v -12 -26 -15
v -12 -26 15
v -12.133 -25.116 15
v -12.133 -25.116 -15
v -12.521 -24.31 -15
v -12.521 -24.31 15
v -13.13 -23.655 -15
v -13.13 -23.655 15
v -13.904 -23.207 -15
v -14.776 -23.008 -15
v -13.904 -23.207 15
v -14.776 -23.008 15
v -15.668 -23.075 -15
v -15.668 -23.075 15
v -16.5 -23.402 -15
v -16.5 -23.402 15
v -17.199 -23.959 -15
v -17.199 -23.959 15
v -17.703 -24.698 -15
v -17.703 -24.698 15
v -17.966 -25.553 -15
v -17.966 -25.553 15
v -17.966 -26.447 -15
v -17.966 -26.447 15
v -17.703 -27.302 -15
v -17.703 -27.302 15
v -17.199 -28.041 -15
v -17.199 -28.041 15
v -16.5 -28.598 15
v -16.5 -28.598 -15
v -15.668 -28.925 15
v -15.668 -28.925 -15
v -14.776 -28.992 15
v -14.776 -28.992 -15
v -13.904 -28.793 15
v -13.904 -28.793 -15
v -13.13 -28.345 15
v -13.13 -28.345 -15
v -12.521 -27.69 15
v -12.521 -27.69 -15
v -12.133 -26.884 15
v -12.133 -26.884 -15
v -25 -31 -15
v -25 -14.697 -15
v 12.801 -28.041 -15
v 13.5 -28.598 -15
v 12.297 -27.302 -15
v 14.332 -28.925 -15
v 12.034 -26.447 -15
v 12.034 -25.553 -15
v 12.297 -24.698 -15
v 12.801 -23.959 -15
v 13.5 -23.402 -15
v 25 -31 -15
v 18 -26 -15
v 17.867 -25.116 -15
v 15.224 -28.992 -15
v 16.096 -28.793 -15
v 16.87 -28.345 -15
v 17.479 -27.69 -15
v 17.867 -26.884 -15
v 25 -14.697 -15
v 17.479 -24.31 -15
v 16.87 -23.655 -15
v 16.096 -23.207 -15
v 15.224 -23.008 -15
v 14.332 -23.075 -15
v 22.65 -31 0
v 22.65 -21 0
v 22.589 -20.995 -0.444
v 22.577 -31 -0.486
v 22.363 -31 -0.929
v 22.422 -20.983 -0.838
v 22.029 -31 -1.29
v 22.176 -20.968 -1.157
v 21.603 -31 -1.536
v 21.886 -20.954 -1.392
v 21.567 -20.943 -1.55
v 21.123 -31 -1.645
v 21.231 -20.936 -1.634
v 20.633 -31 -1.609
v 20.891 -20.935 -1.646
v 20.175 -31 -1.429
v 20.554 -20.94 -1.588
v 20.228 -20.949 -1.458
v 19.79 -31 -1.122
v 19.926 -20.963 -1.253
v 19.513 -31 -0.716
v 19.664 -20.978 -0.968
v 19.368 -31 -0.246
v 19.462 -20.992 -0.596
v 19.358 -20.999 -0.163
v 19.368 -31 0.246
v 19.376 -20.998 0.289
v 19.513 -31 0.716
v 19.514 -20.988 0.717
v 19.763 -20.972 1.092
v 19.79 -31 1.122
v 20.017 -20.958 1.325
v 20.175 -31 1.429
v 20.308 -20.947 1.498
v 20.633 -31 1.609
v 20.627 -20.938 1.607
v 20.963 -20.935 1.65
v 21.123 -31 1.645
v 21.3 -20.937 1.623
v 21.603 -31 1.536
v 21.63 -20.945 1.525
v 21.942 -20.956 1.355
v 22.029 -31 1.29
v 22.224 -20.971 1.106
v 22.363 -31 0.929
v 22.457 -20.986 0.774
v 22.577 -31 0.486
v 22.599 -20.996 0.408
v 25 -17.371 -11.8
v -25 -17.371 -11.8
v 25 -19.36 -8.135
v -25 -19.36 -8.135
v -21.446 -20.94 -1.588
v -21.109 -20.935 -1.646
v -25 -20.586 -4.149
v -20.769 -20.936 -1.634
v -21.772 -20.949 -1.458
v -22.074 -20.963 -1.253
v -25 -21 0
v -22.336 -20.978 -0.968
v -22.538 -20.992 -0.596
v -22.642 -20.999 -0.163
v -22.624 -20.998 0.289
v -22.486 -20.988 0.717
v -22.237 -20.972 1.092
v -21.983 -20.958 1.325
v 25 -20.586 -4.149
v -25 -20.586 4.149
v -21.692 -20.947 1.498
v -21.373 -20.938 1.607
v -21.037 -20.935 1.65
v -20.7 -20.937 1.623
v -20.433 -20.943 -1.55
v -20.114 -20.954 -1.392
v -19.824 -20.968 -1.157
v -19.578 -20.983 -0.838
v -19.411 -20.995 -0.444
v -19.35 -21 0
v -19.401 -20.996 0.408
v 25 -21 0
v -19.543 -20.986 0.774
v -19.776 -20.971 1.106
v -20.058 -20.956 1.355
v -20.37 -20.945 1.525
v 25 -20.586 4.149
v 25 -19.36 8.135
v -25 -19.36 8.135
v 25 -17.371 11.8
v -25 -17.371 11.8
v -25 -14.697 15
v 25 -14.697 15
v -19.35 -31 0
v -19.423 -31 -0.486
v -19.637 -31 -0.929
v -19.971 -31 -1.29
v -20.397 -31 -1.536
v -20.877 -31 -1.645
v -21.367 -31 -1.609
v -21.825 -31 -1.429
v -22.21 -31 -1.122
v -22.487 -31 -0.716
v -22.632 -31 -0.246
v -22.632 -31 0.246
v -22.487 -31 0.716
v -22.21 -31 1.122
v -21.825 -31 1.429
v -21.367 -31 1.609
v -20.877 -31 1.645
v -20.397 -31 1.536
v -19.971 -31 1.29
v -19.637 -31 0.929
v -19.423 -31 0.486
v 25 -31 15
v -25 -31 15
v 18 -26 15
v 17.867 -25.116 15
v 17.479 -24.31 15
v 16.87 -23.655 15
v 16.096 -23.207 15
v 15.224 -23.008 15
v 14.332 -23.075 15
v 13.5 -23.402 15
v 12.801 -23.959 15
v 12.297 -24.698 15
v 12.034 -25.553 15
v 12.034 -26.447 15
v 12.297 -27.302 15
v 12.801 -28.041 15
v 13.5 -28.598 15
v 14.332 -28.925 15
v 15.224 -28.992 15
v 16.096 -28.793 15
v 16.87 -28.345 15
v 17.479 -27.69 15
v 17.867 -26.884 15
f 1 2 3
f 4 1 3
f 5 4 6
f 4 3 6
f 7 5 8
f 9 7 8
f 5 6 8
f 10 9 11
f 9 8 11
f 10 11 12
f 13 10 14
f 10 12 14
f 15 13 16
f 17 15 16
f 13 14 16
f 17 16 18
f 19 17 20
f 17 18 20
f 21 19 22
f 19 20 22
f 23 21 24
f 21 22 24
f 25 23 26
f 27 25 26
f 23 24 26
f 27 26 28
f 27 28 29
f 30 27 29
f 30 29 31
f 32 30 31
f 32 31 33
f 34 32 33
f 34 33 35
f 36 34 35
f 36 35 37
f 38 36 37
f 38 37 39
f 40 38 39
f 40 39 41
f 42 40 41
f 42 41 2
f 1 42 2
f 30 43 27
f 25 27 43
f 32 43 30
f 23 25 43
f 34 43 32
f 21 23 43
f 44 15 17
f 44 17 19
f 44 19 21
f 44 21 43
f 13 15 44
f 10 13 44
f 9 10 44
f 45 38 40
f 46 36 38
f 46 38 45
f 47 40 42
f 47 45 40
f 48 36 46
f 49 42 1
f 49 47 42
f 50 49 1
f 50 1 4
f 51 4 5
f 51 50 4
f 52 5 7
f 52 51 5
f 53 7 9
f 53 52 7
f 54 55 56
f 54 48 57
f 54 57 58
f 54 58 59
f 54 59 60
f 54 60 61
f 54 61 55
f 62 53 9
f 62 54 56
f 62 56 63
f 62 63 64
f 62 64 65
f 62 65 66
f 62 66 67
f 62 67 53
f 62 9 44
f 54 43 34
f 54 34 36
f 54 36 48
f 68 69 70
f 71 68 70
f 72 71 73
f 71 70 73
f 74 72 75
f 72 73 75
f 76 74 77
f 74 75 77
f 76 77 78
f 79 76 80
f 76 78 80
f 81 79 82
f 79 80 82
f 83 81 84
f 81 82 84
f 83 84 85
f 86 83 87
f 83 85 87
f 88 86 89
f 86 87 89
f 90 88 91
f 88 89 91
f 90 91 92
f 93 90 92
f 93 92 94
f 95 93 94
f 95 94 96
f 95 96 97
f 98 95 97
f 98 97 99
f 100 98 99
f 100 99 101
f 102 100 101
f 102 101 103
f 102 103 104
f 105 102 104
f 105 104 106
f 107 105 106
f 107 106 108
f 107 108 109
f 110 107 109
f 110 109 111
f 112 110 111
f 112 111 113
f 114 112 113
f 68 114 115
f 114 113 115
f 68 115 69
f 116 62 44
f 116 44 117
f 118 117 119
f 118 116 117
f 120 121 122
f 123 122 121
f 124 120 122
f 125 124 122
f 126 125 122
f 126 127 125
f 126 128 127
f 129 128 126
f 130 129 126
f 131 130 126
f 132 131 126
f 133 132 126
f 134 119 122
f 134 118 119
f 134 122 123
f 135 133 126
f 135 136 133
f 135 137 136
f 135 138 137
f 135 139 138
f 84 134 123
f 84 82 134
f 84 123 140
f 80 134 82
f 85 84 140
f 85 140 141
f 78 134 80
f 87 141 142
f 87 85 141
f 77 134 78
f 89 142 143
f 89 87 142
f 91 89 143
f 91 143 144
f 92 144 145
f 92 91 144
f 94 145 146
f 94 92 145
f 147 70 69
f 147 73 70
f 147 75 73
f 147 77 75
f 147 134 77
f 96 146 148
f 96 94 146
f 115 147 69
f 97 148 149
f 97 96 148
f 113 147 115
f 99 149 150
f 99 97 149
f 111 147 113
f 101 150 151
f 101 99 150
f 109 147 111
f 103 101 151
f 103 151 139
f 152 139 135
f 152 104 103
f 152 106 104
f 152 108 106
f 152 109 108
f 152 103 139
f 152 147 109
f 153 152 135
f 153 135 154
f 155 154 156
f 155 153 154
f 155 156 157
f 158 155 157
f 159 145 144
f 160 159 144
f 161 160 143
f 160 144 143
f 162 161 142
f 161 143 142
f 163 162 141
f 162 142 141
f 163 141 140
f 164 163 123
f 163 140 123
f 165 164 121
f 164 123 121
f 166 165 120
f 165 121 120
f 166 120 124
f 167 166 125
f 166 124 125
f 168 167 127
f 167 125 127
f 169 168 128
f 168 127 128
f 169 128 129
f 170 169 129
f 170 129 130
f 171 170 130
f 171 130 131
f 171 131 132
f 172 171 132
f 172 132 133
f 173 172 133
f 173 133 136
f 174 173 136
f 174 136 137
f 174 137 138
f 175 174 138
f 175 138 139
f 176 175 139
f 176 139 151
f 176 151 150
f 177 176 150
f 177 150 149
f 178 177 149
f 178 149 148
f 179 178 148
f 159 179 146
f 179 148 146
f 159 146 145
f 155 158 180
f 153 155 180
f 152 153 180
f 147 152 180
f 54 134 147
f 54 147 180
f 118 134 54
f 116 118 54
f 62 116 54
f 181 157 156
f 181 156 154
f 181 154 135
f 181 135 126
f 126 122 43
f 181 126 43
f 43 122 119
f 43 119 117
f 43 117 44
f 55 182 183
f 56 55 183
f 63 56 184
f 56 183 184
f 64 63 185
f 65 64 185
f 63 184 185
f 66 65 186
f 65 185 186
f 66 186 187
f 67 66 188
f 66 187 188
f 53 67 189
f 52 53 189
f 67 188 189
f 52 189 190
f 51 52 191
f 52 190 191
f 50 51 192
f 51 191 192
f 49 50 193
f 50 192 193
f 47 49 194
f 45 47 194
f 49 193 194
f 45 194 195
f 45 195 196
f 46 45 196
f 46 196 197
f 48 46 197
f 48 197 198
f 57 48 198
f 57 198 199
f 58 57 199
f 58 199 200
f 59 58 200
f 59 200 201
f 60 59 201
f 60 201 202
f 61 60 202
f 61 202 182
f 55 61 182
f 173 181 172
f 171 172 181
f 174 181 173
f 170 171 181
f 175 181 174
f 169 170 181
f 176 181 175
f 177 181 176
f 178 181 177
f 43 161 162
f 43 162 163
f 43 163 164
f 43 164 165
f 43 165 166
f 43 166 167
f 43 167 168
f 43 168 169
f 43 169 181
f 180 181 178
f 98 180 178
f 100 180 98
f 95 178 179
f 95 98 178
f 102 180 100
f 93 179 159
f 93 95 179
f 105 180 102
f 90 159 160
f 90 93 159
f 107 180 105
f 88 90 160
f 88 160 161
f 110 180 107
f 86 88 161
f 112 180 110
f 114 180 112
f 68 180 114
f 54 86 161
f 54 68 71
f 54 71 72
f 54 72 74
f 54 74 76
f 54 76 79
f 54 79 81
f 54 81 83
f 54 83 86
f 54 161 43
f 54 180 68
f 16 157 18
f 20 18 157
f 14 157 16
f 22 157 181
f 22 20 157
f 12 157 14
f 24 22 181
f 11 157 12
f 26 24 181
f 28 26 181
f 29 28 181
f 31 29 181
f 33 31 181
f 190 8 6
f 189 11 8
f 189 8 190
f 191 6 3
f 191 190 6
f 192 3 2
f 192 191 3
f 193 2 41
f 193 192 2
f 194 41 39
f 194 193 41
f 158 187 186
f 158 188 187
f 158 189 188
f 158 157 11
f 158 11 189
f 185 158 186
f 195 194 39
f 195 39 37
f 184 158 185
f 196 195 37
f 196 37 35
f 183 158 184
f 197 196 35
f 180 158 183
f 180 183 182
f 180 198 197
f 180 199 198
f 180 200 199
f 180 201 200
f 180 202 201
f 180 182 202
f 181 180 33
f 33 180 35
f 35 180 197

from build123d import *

# Parameters (mm, degrees)
EXTRUDE_1_DEPTH       = 25
HOLE_WIZARD_6_0_6_1_D = 6
HOLE_WIZARD_M4_1_D    = 3.3


with BuildPart() as part:
    # 草图1 → 凸台-拉伸1 (new, symmetric)
    with BuildSketch(Plane(origin=(0, 0, 0), x_dir=(0, 0, -1), z_dir=(1, 0, 0))):
        with BuildLine():
            Line((-15, -31), (15, -31))
            Line((15, -31), (15, -14.696938457))
            ThreePointArc((15, -14.696938457), (0, -21), (-15, -14.696938457))
            Line((-15, -14.696938457), (-15, -31))
        make_face()
    extrude(amount=EXTRUDE_1_DEPTH, both=True)

    # Ø6.0 (6) 直径孔1 (through all)
    with Locations(Plane(origin=(0, 0, -15), x_dir=(-1, 0, 0), z_dir=(0, 0, -1))):
        with Locations((-15, -26), (15, -26)):
            Hole(HOLE_WIZARD_6_0_6_1_D / 2)

    # M4 螺纹孔1 (through all)
    with Locations(Plane(origin=(0, -31, 0), x_dir=(-1, 0, 0), z_dir=(0, -1, 0))):
        with Locations((-21, 0), (21, 0)):
            Hole(HOLE_WIZARD_M4_1_D / 2)


solid = part.part
